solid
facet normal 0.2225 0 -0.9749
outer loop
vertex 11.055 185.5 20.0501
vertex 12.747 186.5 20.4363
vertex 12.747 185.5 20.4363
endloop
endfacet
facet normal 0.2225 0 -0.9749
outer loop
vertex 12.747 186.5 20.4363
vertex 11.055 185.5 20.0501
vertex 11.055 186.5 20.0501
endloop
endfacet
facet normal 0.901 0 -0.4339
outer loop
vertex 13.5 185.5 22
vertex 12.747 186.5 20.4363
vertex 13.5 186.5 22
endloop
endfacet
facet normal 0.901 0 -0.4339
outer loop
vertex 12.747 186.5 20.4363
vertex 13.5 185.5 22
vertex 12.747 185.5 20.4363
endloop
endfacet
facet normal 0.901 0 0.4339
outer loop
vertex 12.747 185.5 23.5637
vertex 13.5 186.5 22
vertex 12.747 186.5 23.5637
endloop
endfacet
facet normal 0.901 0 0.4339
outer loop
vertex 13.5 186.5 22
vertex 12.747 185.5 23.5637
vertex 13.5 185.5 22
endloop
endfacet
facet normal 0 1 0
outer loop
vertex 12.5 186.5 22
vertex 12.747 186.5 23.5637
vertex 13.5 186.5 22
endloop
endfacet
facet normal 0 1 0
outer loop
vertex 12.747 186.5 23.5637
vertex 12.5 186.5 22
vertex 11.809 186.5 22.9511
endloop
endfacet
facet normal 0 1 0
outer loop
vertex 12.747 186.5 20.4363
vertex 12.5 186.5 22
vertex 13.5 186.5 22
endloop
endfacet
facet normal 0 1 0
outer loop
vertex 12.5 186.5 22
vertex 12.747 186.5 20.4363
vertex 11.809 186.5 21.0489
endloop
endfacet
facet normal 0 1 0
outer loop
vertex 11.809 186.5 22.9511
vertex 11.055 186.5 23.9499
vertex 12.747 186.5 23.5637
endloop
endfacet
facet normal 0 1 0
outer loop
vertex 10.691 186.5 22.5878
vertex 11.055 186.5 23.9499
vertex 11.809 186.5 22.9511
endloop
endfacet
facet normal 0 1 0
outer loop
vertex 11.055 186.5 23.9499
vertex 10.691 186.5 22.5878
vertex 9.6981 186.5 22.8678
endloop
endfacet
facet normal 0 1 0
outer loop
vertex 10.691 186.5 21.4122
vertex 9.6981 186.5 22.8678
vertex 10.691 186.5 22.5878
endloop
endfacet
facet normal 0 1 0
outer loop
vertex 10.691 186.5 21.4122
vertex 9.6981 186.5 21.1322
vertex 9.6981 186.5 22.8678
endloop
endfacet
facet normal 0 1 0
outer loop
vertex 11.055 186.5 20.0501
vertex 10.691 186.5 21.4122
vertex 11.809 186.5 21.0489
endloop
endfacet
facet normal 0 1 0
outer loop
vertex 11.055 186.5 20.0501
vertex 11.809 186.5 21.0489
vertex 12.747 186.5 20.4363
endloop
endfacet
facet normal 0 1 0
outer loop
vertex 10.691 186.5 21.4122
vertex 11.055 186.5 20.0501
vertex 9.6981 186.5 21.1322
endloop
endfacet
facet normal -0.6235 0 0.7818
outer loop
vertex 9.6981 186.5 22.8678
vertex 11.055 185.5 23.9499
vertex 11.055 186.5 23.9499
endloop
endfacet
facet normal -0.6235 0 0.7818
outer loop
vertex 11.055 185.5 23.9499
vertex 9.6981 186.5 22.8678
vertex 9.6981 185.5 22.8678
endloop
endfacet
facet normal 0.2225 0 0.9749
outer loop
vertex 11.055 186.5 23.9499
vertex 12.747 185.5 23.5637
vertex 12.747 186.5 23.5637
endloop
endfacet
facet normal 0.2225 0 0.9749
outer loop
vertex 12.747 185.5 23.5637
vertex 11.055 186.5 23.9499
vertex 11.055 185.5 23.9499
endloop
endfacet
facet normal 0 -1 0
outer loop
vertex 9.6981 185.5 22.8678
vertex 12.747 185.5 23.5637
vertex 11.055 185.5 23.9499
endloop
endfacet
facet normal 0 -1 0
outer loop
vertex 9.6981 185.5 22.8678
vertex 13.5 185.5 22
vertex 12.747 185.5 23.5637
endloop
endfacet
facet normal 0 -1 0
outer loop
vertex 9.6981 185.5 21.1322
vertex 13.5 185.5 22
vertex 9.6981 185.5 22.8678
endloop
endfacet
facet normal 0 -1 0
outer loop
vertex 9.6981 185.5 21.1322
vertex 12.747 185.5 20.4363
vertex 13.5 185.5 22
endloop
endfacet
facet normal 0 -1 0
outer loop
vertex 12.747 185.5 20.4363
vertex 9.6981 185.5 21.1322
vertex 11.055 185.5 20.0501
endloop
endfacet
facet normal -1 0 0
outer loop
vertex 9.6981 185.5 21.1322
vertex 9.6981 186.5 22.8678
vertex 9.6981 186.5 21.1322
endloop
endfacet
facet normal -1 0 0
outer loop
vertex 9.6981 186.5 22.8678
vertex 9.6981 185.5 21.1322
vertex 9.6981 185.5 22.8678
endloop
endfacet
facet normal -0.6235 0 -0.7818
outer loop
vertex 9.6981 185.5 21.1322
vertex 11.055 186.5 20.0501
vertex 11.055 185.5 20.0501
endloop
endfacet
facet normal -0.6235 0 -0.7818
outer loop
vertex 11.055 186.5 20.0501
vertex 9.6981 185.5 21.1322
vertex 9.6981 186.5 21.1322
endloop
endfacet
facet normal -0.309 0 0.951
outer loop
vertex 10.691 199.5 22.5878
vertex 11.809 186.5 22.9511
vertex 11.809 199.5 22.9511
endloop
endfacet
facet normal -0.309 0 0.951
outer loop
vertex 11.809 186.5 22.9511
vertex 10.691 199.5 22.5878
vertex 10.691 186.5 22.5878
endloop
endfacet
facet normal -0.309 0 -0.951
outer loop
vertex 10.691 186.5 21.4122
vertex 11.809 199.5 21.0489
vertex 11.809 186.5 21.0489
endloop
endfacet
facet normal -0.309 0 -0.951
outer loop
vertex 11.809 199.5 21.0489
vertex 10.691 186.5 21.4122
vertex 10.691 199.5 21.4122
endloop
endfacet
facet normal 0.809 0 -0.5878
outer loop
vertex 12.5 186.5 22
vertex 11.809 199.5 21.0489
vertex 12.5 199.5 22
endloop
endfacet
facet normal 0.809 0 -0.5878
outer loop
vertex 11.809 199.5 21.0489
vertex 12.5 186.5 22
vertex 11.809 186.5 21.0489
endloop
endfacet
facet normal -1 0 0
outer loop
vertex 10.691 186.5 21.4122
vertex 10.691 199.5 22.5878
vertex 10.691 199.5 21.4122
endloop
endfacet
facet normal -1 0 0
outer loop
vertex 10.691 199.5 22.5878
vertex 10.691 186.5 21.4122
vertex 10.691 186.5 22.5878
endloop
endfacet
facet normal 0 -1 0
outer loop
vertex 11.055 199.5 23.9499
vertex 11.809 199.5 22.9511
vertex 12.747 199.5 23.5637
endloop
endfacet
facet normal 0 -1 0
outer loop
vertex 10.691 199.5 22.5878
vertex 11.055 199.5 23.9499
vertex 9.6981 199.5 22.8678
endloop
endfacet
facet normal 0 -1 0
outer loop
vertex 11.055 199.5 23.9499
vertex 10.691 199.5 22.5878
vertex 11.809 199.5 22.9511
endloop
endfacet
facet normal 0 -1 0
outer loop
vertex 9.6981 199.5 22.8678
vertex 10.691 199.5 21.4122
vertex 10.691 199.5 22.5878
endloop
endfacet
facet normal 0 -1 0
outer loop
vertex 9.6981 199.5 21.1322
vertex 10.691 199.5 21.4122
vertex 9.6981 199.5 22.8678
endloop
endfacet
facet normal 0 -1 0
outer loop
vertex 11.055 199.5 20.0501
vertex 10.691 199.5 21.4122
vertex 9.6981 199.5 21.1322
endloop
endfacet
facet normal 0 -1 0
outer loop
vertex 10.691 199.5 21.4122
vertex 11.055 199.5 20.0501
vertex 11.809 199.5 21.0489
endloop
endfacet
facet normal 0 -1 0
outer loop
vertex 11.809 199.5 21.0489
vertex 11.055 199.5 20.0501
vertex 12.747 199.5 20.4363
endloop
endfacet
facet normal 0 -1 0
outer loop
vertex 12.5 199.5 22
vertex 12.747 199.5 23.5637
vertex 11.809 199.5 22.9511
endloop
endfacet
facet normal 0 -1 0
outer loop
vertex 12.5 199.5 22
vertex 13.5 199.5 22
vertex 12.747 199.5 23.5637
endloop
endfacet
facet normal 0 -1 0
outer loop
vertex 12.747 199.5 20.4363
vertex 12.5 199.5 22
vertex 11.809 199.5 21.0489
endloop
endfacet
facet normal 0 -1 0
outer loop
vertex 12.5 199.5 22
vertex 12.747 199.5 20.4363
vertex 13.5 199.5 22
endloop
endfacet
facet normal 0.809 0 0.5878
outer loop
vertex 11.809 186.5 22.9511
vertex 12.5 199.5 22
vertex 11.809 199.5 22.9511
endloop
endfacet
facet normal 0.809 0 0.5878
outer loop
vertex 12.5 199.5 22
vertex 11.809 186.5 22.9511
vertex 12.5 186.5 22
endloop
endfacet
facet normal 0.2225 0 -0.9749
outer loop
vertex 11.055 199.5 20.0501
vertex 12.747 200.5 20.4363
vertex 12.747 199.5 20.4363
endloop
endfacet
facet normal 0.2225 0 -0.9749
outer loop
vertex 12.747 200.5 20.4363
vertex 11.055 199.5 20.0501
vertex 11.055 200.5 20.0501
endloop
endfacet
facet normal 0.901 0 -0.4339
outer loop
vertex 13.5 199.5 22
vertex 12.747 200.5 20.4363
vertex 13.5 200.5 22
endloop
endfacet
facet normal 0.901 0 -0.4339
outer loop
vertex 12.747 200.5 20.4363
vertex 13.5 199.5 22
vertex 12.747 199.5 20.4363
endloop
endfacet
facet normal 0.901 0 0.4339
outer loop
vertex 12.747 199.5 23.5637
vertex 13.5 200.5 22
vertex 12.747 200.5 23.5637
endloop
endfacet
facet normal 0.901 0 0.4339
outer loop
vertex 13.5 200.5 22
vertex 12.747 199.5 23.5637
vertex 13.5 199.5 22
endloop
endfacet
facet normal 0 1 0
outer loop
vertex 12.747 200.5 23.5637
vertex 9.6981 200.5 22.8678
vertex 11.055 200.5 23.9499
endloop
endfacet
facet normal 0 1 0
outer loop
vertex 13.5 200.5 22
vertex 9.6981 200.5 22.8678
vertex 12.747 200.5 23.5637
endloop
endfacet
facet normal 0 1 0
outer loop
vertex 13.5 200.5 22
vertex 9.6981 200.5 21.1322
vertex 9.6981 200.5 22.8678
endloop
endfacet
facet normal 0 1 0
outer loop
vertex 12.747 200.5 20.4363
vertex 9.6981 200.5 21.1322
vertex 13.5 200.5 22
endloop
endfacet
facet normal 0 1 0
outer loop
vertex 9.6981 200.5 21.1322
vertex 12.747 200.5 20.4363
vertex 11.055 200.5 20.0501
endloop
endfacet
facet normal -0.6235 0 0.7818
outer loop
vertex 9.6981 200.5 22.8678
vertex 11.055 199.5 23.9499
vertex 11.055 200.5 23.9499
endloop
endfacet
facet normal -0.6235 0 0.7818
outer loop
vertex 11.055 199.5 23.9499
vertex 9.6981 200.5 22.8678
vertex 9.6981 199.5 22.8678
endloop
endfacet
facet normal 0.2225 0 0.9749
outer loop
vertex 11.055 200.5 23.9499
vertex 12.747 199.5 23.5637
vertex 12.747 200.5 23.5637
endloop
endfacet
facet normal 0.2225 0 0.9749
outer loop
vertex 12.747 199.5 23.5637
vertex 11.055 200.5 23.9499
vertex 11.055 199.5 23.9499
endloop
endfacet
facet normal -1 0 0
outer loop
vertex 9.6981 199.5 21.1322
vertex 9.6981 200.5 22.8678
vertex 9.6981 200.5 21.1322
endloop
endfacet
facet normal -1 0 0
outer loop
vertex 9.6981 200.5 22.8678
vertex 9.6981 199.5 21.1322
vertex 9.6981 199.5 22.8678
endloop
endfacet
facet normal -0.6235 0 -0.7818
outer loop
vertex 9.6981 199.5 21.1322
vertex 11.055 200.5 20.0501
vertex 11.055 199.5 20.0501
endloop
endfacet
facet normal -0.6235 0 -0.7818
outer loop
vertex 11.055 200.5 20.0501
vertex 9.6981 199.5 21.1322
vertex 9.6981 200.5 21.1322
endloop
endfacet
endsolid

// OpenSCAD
// Generated from the same CSG operations as STEP. Rebuild with spec/build_parent_hand_service.py.
translate([11.5,185.5,22]) rotate([-90,0,0]) union(){cylinder(r=2,h=1);translate([0,0,1]) cylinder(r=1,h=13);translate([0,0,14]) cylinder(r=2,h=1);}
